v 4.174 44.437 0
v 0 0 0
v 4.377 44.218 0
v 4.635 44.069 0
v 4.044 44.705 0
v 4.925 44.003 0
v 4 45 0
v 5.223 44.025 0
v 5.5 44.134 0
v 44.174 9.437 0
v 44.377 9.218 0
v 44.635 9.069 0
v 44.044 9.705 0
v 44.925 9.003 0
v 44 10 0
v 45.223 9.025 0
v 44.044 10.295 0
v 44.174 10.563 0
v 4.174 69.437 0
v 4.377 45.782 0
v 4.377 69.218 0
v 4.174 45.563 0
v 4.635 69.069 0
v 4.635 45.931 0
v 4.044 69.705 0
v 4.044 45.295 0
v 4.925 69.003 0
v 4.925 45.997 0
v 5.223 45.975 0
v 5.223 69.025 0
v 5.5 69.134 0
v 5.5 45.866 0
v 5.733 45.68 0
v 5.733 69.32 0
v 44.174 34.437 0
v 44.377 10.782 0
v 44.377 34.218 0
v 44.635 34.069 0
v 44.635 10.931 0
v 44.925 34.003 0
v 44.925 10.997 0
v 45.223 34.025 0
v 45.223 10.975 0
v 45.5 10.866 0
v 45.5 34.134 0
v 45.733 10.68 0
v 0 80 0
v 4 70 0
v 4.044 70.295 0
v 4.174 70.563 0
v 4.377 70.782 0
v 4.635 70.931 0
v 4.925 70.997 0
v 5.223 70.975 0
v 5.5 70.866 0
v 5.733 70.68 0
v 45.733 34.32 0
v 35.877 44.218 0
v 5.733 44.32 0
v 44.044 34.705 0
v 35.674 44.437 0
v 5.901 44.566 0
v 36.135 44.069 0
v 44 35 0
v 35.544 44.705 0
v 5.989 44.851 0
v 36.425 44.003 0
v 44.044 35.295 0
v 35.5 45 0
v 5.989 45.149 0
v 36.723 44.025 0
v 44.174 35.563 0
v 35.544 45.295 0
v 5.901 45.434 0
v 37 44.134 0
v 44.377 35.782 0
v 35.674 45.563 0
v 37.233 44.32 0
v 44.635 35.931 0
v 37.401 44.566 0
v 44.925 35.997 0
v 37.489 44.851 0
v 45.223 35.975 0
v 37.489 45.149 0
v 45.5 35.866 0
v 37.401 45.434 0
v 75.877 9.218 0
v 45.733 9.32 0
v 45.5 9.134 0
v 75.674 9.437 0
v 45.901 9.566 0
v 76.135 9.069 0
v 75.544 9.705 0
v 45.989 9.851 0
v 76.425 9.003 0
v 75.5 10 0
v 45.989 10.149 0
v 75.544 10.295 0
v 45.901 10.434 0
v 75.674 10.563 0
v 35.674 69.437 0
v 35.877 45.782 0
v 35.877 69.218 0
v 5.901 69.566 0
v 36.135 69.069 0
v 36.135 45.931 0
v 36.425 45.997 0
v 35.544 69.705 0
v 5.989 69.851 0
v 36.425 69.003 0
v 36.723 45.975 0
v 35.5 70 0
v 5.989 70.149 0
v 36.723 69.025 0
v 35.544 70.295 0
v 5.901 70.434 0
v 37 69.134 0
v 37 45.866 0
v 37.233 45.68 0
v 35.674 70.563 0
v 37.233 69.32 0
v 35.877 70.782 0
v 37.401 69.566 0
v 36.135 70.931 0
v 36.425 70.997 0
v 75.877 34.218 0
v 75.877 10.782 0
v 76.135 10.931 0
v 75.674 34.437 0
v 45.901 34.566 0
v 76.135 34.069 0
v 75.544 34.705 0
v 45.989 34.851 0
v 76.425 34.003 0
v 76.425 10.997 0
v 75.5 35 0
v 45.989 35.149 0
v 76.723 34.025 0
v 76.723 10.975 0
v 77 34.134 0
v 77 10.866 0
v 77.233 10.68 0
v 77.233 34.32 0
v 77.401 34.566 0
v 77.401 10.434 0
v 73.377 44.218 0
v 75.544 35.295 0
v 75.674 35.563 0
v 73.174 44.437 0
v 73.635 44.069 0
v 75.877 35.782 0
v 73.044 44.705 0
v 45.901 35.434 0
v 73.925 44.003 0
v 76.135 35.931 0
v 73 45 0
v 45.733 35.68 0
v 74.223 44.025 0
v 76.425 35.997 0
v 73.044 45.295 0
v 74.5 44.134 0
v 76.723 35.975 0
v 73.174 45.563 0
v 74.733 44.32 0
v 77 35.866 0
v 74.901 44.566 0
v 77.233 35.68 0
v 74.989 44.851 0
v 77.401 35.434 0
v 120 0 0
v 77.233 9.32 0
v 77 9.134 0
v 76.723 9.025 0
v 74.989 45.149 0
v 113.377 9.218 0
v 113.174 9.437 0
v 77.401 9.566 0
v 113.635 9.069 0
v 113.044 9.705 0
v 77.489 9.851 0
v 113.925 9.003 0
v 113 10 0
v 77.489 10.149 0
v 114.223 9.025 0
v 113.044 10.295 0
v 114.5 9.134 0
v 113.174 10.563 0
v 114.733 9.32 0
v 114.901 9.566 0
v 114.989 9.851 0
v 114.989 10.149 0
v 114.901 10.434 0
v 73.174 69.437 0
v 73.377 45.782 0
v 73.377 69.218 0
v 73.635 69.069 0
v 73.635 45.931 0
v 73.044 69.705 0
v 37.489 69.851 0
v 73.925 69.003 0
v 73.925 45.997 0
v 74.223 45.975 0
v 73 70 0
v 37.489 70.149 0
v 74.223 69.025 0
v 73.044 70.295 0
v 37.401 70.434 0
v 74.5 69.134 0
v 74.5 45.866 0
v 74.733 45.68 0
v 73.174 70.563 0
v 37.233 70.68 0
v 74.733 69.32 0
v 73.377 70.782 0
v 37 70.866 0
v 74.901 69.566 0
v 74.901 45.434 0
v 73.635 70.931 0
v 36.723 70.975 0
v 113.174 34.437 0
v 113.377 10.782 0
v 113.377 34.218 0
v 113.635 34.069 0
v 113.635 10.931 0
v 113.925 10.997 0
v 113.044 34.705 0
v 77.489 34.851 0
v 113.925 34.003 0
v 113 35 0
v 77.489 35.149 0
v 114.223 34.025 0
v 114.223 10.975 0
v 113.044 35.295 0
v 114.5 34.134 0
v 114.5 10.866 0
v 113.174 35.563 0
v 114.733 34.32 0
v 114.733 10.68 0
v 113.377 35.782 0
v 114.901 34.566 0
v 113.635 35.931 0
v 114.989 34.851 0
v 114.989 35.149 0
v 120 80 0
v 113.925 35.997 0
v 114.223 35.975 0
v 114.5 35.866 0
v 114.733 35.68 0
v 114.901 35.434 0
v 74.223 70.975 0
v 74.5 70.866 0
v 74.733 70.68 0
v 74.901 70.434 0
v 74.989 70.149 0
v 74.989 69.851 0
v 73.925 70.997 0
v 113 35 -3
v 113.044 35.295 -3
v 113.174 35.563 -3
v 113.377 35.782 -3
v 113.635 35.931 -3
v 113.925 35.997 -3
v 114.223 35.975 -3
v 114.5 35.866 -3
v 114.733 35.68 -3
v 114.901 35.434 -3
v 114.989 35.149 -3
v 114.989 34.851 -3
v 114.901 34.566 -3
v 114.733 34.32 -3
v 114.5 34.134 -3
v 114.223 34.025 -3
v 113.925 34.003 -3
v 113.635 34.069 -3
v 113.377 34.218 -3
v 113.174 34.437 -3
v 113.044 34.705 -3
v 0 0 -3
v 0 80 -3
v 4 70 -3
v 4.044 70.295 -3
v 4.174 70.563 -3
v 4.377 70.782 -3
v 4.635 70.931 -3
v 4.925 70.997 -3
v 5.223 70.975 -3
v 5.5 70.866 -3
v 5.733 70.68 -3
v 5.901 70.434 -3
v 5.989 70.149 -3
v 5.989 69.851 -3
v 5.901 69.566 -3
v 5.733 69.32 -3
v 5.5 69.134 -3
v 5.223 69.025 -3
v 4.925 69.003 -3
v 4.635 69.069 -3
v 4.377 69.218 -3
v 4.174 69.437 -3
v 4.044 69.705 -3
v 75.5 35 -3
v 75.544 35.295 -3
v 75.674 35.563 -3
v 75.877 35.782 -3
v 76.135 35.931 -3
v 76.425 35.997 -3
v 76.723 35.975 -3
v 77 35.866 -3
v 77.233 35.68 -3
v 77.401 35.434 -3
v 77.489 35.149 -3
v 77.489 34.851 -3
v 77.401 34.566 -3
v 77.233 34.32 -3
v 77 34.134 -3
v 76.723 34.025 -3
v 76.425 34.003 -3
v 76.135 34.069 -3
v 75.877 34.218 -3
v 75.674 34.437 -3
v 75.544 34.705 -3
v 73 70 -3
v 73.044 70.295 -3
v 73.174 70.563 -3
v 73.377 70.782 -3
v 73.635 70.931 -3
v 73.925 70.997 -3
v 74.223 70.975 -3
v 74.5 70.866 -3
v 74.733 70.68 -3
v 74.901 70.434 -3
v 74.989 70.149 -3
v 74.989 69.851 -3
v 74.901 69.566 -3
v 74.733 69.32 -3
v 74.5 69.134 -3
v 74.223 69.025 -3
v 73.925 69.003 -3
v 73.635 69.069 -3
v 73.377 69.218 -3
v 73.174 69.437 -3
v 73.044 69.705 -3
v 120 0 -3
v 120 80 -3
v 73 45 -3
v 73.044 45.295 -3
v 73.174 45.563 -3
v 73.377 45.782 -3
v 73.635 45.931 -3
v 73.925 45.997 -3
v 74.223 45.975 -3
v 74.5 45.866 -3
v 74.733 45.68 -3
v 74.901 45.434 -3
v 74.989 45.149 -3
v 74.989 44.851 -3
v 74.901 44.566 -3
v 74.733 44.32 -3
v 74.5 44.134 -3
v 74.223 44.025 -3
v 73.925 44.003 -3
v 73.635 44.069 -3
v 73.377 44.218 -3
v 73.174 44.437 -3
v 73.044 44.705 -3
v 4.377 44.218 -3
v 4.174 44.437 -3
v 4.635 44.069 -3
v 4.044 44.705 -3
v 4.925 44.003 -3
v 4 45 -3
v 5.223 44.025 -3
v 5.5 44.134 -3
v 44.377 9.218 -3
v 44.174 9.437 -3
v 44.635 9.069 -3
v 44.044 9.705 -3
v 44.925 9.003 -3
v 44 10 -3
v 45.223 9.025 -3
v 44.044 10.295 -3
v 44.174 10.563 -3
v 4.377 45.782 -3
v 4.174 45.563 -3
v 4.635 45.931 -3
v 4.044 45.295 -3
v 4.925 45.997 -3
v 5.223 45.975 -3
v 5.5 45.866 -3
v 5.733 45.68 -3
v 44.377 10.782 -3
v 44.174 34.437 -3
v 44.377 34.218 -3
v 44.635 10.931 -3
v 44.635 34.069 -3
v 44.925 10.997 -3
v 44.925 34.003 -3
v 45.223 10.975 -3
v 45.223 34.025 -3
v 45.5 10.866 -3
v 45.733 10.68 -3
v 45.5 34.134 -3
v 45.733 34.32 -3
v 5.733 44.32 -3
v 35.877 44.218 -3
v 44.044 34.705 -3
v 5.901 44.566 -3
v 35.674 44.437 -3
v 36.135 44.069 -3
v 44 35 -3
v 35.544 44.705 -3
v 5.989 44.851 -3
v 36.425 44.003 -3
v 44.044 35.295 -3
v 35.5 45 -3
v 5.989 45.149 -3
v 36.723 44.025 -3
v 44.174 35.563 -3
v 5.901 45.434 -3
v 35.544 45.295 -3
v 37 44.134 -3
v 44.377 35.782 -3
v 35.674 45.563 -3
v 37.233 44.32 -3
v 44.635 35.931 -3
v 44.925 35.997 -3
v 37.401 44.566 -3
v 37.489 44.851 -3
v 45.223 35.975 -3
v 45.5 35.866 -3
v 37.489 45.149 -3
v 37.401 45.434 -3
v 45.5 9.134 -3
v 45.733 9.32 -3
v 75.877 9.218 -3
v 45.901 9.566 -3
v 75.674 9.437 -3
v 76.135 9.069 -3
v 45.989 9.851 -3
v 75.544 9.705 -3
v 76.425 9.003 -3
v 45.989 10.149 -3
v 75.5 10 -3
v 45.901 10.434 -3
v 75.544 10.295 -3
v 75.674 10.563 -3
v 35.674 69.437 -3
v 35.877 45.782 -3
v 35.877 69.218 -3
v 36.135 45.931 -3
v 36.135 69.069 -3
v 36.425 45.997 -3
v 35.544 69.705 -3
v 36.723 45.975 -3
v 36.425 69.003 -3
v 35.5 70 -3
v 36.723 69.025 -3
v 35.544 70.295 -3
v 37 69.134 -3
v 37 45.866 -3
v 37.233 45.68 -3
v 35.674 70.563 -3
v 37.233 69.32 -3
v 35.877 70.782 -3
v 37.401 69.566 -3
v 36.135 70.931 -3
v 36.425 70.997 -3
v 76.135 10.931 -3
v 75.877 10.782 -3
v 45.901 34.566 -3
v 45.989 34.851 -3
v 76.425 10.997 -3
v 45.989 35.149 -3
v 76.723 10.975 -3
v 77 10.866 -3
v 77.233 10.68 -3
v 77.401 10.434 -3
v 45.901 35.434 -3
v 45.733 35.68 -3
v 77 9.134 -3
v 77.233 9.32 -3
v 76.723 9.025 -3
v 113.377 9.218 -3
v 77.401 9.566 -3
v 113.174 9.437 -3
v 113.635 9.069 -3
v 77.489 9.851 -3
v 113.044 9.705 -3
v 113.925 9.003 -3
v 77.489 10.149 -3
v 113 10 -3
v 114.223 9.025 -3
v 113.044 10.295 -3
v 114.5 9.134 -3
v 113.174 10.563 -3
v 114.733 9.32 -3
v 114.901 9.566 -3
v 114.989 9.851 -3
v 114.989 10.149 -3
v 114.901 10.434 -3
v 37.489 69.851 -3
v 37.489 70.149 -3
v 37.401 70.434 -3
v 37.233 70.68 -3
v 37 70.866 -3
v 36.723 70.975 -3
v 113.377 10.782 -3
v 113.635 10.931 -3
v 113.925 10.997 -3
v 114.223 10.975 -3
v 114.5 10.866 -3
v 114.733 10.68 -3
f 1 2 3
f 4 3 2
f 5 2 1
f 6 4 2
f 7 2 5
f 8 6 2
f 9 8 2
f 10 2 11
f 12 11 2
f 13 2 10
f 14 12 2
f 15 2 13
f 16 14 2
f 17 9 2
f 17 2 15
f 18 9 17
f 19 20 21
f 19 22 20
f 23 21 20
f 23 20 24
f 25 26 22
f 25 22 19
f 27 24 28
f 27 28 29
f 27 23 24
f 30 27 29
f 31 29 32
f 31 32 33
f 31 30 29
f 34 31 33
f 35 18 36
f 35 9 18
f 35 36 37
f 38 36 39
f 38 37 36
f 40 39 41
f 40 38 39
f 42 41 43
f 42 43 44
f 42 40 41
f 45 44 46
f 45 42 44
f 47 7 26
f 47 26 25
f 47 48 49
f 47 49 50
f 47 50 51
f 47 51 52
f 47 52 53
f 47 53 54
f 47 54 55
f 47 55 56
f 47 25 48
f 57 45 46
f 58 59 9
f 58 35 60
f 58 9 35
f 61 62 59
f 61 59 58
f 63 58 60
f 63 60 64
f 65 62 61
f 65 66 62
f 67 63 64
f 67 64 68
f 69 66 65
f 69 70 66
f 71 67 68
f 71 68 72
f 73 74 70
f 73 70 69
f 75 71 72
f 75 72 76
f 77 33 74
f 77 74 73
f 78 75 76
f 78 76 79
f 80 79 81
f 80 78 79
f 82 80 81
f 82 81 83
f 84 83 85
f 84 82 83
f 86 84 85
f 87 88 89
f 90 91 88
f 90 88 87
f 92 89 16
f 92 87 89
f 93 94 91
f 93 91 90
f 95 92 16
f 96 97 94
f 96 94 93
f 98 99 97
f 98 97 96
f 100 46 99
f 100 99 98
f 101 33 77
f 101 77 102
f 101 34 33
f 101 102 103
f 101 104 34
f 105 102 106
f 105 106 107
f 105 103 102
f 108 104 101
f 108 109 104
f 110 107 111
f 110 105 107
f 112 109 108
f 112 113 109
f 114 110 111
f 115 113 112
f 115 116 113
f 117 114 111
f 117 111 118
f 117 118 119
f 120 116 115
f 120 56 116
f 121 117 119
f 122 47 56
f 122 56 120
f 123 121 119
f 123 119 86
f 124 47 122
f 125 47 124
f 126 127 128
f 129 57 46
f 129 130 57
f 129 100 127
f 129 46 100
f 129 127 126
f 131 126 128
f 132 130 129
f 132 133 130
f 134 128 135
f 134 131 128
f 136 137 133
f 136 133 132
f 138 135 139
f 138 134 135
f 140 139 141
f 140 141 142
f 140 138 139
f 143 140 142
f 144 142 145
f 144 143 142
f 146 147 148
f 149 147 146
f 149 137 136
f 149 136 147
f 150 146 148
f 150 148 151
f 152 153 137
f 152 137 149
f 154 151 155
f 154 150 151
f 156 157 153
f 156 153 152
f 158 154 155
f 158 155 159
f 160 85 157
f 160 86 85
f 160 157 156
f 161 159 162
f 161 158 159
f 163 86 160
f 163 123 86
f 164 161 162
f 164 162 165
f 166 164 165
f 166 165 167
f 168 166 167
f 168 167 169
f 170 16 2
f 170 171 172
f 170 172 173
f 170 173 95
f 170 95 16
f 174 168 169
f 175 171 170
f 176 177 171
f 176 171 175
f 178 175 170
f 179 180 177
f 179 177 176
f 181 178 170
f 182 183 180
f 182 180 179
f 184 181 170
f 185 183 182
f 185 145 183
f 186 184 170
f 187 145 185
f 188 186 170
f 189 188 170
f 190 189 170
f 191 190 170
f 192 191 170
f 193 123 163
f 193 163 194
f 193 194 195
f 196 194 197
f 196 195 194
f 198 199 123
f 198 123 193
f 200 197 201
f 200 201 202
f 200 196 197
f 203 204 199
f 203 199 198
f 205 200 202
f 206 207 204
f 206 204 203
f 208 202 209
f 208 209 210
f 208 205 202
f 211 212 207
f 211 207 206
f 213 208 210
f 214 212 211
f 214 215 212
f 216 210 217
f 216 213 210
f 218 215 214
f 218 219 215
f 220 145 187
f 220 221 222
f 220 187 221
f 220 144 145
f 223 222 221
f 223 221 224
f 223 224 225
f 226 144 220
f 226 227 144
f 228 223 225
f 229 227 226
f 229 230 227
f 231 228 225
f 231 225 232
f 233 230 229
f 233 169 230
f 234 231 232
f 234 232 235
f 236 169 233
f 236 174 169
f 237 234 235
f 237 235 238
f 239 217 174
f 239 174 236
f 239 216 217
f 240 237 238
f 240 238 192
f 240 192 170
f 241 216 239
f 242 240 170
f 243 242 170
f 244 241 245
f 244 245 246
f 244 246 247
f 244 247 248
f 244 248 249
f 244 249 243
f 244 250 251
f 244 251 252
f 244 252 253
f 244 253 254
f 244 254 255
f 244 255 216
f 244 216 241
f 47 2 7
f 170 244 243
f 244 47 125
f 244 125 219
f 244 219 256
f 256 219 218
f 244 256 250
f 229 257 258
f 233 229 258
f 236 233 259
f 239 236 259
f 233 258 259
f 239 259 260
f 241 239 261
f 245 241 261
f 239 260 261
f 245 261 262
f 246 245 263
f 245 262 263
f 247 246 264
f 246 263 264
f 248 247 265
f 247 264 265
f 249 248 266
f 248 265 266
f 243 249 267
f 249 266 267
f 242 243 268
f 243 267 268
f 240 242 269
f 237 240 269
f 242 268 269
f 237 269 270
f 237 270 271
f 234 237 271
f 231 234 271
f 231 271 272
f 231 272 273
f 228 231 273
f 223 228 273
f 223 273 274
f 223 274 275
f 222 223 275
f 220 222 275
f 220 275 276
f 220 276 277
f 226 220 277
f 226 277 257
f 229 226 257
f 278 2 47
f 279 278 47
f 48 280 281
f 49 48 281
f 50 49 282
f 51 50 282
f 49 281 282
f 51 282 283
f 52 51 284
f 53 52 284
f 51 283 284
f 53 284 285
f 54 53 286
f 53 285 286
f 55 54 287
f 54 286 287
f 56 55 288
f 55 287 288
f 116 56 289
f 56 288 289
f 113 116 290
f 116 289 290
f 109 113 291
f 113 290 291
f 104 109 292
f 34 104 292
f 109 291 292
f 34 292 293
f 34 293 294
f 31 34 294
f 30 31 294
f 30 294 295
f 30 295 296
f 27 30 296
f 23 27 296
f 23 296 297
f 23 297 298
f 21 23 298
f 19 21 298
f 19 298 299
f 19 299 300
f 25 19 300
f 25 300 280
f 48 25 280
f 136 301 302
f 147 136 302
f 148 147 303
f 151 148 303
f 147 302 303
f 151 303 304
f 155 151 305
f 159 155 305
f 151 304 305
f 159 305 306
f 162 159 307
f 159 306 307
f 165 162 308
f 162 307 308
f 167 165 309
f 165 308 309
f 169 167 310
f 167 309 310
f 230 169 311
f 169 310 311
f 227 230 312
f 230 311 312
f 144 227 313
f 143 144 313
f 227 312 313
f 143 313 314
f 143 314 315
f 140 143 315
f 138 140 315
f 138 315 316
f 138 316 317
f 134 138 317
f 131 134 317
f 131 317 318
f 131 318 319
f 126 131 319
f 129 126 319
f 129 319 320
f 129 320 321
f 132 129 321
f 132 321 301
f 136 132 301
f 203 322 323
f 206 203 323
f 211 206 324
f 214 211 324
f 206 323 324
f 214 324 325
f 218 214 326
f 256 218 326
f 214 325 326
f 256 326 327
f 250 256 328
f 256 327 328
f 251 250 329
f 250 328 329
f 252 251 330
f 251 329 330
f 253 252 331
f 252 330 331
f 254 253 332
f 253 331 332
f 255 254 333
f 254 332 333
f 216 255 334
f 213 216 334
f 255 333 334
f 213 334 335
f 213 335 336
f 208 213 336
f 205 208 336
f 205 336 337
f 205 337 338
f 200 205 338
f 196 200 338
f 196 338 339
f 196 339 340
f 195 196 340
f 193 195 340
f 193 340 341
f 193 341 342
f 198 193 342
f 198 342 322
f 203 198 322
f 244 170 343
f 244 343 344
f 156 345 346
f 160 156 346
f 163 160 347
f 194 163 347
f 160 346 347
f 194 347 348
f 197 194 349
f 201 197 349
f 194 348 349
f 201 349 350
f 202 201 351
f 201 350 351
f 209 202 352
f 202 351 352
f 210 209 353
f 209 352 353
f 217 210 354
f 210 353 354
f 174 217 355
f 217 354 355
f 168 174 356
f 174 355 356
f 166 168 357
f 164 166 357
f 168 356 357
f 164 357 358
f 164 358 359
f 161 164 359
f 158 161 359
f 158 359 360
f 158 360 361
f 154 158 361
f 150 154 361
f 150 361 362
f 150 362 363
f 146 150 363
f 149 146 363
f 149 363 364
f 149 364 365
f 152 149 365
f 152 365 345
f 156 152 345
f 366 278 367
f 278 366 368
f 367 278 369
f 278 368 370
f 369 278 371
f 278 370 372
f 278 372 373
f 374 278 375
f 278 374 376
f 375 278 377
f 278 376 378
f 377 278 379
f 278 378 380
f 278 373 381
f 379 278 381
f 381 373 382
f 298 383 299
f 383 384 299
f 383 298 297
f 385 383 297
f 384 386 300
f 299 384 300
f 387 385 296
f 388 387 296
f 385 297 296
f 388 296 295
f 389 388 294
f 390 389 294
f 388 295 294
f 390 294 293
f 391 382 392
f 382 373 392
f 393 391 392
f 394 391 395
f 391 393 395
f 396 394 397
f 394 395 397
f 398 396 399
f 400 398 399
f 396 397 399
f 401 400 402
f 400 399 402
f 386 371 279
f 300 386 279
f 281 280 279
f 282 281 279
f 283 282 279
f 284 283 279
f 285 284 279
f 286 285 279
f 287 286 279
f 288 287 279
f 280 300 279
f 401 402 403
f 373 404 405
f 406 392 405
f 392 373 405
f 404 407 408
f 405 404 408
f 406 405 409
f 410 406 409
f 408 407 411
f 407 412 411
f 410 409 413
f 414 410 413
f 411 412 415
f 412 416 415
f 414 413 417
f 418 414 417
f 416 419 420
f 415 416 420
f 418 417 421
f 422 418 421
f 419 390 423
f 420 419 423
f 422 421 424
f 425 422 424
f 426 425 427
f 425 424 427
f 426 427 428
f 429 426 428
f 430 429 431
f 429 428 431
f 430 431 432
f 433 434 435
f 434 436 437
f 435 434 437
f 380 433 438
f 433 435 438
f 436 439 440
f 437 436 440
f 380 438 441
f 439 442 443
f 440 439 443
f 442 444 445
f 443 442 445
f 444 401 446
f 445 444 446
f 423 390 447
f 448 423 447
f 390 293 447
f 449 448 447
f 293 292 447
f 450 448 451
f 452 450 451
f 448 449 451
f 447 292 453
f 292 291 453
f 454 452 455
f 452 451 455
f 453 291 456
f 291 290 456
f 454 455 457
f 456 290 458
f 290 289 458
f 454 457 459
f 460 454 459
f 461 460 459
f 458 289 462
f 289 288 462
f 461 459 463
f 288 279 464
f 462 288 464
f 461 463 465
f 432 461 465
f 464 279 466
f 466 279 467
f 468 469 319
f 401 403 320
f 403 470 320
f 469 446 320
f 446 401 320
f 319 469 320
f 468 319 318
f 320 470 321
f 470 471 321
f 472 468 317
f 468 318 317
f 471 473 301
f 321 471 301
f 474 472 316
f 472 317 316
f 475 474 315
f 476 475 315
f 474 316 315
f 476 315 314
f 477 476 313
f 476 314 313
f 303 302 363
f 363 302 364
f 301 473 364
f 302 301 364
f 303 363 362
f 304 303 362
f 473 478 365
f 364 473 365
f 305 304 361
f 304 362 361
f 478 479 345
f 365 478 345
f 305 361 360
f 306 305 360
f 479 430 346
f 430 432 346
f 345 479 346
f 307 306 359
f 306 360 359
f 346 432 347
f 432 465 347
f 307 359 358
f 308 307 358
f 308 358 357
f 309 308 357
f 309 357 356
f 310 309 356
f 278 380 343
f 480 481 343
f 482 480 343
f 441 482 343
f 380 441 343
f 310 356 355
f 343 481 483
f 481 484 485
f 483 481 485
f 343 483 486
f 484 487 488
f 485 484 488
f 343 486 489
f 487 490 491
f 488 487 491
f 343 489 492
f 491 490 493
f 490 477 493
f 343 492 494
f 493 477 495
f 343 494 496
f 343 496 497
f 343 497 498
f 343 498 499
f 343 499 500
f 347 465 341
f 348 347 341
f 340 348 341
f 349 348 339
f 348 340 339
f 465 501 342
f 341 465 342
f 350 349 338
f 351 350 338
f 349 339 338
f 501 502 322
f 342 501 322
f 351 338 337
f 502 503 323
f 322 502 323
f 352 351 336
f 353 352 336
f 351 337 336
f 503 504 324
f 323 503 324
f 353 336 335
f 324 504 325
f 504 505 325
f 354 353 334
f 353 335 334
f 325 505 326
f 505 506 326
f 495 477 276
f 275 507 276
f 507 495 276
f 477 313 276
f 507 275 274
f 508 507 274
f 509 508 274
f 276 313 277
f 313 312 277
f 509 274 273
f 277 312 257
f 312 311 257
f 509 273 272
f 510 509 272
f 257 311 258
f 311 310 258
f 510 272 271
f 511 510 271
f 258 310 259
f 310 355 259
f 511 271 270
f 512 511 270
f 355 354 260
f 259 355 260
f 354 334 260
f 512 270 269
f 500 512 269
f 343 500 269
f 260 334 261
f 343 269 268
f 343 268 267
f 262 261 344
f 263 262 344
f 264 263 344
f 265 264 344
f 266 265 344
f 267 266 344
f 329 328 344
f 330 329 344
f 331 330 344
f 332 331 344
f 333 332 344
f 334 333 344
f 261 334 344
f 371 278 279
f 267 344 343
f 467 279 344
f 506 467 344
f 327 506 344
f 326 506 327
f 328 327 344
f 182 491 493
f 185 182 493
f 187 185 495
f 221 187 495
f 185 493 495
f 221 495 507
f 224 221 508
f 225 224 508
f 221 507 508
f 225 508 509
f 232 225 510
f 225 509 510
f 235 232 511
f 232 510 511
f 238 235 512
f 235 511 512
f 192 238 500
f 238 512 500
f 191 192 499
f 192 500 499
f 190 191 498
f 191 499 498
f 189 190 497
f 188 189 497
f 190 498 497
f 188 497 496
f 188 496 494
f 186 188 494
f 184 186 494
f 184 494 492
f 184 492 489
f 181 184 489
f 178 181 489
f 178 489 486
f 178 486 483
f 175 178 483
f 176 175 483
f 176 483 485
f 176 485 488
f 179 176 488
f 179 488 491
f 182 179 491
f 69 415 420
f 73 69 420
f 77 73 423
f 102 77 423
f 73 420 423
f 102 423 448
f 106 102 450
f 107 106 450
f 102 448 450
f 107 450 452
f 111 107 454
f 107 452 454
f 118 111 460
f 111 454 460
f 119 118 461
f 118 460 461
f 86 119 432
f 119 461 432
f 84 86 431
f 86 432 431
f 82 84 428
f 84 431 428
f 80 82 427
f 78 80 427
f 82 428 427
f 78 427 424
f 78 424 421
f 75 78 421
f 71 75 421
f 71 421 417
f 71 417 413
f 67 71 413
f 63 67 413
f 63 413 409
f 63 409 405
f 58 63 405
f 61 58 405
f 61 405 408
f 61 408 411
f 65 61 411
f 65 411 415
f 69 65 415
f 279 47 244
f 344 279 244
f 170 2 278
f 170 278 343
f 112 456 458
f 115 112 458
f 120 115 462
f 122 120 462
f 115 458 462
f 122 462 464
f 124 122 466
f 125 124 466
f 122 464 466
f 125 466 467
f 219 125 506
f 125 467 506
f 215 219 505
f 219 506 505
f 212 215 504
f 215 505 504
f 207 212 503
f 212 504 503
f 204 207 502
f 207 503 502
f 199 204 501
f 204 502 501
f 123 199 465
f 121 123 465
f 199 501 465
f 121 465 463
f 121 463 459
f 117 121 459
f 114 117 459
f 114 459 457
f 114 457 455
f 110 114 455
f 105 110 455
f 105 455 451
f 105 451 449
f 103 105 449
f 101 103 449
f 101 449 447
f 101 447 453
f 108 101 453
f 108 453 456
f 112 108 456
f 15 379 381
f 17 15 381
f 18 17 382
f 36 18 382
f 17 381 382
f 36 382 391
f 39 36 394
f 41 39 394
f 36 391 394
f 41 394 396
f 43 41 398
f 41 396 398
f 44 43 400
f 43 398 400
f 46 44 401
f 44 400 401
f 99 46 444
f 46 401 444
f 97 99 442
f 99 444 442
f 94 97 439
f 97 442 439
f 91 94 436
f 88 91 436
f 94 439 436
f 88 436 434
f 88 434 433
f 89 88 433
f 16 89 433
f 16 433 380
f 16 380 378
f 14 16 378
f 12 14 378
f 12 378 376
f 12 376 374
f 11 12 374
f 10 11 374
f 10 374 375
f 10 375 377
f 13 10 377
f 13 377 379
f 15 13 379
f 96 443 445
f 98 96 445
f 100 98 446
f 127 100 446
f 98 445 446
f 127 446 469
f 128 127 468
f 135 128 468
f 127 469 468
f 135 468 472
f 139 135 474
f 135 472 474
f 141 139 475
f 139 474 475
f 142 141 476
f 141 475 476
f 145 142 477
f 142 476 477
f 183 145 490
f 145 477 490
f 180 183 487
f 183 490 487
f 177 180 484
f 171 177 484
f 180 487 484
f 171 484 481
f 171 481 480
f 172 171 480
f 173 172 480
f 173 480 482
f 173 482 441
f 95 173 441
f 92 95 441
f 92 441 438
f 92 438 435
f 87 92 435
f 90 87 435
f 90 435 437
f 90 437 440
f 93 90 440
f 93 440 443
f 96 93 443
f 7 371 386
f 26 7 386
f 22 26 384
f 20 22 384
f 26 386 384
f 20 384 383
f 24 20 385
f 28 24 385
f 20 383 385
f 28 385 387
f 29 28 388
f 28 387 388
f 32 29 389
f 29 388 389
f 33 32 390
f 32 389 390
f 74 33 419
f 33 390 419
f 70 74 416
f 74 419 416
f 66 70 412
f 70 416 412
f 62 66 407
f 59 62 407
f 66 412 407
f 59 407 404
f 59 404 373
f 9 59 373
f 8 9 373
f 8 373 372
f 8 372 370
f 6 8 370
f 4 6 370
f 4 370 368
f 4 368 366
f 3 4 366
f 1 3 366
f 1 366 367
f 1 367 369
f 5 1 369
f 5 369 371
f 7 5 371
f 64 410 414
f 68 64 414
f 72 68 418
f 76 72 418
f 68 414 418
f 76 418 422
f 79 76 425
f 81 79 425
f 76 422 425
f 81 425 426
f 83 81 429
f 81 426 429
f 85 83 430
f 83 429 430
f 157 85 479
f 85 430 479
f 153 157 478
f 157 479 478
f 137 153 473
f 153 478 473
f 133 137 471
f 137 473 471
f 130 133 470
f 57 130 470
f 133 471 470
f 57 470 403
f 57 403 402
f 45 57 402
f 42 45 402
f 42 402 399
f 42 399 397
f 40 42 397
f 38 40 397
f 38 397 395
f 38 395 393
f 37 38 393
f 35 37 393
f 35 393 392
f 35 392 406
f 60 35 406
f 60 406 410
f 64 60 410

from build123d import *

# Parameters (mm, degrees)
F0_W     = 120
F0_H     = 80
F1_DEPTH = 3
F3_D     = 2


with BuildPart() as f1:
    # F0 (on Top) → F1 (new body)
    with BuildSketch(Plane.XY):
        with Locations((60, 40)):
            Rectangle(F0_W, F0_H)
    extrude(amount=-F1_DEPTH)

    # F3 (through all)
    with Locations(Plane.XY):
        with Locations((5, 70), (76.5, 35), (114, 10), (114, 35), (76.5, 10), (74, 45), (45, 10), (45, 35), (36.5, 70), (74, 70), (5, 45), (36.5, 45)):
            Hole(F3_D / 2)


solid = f1.part
